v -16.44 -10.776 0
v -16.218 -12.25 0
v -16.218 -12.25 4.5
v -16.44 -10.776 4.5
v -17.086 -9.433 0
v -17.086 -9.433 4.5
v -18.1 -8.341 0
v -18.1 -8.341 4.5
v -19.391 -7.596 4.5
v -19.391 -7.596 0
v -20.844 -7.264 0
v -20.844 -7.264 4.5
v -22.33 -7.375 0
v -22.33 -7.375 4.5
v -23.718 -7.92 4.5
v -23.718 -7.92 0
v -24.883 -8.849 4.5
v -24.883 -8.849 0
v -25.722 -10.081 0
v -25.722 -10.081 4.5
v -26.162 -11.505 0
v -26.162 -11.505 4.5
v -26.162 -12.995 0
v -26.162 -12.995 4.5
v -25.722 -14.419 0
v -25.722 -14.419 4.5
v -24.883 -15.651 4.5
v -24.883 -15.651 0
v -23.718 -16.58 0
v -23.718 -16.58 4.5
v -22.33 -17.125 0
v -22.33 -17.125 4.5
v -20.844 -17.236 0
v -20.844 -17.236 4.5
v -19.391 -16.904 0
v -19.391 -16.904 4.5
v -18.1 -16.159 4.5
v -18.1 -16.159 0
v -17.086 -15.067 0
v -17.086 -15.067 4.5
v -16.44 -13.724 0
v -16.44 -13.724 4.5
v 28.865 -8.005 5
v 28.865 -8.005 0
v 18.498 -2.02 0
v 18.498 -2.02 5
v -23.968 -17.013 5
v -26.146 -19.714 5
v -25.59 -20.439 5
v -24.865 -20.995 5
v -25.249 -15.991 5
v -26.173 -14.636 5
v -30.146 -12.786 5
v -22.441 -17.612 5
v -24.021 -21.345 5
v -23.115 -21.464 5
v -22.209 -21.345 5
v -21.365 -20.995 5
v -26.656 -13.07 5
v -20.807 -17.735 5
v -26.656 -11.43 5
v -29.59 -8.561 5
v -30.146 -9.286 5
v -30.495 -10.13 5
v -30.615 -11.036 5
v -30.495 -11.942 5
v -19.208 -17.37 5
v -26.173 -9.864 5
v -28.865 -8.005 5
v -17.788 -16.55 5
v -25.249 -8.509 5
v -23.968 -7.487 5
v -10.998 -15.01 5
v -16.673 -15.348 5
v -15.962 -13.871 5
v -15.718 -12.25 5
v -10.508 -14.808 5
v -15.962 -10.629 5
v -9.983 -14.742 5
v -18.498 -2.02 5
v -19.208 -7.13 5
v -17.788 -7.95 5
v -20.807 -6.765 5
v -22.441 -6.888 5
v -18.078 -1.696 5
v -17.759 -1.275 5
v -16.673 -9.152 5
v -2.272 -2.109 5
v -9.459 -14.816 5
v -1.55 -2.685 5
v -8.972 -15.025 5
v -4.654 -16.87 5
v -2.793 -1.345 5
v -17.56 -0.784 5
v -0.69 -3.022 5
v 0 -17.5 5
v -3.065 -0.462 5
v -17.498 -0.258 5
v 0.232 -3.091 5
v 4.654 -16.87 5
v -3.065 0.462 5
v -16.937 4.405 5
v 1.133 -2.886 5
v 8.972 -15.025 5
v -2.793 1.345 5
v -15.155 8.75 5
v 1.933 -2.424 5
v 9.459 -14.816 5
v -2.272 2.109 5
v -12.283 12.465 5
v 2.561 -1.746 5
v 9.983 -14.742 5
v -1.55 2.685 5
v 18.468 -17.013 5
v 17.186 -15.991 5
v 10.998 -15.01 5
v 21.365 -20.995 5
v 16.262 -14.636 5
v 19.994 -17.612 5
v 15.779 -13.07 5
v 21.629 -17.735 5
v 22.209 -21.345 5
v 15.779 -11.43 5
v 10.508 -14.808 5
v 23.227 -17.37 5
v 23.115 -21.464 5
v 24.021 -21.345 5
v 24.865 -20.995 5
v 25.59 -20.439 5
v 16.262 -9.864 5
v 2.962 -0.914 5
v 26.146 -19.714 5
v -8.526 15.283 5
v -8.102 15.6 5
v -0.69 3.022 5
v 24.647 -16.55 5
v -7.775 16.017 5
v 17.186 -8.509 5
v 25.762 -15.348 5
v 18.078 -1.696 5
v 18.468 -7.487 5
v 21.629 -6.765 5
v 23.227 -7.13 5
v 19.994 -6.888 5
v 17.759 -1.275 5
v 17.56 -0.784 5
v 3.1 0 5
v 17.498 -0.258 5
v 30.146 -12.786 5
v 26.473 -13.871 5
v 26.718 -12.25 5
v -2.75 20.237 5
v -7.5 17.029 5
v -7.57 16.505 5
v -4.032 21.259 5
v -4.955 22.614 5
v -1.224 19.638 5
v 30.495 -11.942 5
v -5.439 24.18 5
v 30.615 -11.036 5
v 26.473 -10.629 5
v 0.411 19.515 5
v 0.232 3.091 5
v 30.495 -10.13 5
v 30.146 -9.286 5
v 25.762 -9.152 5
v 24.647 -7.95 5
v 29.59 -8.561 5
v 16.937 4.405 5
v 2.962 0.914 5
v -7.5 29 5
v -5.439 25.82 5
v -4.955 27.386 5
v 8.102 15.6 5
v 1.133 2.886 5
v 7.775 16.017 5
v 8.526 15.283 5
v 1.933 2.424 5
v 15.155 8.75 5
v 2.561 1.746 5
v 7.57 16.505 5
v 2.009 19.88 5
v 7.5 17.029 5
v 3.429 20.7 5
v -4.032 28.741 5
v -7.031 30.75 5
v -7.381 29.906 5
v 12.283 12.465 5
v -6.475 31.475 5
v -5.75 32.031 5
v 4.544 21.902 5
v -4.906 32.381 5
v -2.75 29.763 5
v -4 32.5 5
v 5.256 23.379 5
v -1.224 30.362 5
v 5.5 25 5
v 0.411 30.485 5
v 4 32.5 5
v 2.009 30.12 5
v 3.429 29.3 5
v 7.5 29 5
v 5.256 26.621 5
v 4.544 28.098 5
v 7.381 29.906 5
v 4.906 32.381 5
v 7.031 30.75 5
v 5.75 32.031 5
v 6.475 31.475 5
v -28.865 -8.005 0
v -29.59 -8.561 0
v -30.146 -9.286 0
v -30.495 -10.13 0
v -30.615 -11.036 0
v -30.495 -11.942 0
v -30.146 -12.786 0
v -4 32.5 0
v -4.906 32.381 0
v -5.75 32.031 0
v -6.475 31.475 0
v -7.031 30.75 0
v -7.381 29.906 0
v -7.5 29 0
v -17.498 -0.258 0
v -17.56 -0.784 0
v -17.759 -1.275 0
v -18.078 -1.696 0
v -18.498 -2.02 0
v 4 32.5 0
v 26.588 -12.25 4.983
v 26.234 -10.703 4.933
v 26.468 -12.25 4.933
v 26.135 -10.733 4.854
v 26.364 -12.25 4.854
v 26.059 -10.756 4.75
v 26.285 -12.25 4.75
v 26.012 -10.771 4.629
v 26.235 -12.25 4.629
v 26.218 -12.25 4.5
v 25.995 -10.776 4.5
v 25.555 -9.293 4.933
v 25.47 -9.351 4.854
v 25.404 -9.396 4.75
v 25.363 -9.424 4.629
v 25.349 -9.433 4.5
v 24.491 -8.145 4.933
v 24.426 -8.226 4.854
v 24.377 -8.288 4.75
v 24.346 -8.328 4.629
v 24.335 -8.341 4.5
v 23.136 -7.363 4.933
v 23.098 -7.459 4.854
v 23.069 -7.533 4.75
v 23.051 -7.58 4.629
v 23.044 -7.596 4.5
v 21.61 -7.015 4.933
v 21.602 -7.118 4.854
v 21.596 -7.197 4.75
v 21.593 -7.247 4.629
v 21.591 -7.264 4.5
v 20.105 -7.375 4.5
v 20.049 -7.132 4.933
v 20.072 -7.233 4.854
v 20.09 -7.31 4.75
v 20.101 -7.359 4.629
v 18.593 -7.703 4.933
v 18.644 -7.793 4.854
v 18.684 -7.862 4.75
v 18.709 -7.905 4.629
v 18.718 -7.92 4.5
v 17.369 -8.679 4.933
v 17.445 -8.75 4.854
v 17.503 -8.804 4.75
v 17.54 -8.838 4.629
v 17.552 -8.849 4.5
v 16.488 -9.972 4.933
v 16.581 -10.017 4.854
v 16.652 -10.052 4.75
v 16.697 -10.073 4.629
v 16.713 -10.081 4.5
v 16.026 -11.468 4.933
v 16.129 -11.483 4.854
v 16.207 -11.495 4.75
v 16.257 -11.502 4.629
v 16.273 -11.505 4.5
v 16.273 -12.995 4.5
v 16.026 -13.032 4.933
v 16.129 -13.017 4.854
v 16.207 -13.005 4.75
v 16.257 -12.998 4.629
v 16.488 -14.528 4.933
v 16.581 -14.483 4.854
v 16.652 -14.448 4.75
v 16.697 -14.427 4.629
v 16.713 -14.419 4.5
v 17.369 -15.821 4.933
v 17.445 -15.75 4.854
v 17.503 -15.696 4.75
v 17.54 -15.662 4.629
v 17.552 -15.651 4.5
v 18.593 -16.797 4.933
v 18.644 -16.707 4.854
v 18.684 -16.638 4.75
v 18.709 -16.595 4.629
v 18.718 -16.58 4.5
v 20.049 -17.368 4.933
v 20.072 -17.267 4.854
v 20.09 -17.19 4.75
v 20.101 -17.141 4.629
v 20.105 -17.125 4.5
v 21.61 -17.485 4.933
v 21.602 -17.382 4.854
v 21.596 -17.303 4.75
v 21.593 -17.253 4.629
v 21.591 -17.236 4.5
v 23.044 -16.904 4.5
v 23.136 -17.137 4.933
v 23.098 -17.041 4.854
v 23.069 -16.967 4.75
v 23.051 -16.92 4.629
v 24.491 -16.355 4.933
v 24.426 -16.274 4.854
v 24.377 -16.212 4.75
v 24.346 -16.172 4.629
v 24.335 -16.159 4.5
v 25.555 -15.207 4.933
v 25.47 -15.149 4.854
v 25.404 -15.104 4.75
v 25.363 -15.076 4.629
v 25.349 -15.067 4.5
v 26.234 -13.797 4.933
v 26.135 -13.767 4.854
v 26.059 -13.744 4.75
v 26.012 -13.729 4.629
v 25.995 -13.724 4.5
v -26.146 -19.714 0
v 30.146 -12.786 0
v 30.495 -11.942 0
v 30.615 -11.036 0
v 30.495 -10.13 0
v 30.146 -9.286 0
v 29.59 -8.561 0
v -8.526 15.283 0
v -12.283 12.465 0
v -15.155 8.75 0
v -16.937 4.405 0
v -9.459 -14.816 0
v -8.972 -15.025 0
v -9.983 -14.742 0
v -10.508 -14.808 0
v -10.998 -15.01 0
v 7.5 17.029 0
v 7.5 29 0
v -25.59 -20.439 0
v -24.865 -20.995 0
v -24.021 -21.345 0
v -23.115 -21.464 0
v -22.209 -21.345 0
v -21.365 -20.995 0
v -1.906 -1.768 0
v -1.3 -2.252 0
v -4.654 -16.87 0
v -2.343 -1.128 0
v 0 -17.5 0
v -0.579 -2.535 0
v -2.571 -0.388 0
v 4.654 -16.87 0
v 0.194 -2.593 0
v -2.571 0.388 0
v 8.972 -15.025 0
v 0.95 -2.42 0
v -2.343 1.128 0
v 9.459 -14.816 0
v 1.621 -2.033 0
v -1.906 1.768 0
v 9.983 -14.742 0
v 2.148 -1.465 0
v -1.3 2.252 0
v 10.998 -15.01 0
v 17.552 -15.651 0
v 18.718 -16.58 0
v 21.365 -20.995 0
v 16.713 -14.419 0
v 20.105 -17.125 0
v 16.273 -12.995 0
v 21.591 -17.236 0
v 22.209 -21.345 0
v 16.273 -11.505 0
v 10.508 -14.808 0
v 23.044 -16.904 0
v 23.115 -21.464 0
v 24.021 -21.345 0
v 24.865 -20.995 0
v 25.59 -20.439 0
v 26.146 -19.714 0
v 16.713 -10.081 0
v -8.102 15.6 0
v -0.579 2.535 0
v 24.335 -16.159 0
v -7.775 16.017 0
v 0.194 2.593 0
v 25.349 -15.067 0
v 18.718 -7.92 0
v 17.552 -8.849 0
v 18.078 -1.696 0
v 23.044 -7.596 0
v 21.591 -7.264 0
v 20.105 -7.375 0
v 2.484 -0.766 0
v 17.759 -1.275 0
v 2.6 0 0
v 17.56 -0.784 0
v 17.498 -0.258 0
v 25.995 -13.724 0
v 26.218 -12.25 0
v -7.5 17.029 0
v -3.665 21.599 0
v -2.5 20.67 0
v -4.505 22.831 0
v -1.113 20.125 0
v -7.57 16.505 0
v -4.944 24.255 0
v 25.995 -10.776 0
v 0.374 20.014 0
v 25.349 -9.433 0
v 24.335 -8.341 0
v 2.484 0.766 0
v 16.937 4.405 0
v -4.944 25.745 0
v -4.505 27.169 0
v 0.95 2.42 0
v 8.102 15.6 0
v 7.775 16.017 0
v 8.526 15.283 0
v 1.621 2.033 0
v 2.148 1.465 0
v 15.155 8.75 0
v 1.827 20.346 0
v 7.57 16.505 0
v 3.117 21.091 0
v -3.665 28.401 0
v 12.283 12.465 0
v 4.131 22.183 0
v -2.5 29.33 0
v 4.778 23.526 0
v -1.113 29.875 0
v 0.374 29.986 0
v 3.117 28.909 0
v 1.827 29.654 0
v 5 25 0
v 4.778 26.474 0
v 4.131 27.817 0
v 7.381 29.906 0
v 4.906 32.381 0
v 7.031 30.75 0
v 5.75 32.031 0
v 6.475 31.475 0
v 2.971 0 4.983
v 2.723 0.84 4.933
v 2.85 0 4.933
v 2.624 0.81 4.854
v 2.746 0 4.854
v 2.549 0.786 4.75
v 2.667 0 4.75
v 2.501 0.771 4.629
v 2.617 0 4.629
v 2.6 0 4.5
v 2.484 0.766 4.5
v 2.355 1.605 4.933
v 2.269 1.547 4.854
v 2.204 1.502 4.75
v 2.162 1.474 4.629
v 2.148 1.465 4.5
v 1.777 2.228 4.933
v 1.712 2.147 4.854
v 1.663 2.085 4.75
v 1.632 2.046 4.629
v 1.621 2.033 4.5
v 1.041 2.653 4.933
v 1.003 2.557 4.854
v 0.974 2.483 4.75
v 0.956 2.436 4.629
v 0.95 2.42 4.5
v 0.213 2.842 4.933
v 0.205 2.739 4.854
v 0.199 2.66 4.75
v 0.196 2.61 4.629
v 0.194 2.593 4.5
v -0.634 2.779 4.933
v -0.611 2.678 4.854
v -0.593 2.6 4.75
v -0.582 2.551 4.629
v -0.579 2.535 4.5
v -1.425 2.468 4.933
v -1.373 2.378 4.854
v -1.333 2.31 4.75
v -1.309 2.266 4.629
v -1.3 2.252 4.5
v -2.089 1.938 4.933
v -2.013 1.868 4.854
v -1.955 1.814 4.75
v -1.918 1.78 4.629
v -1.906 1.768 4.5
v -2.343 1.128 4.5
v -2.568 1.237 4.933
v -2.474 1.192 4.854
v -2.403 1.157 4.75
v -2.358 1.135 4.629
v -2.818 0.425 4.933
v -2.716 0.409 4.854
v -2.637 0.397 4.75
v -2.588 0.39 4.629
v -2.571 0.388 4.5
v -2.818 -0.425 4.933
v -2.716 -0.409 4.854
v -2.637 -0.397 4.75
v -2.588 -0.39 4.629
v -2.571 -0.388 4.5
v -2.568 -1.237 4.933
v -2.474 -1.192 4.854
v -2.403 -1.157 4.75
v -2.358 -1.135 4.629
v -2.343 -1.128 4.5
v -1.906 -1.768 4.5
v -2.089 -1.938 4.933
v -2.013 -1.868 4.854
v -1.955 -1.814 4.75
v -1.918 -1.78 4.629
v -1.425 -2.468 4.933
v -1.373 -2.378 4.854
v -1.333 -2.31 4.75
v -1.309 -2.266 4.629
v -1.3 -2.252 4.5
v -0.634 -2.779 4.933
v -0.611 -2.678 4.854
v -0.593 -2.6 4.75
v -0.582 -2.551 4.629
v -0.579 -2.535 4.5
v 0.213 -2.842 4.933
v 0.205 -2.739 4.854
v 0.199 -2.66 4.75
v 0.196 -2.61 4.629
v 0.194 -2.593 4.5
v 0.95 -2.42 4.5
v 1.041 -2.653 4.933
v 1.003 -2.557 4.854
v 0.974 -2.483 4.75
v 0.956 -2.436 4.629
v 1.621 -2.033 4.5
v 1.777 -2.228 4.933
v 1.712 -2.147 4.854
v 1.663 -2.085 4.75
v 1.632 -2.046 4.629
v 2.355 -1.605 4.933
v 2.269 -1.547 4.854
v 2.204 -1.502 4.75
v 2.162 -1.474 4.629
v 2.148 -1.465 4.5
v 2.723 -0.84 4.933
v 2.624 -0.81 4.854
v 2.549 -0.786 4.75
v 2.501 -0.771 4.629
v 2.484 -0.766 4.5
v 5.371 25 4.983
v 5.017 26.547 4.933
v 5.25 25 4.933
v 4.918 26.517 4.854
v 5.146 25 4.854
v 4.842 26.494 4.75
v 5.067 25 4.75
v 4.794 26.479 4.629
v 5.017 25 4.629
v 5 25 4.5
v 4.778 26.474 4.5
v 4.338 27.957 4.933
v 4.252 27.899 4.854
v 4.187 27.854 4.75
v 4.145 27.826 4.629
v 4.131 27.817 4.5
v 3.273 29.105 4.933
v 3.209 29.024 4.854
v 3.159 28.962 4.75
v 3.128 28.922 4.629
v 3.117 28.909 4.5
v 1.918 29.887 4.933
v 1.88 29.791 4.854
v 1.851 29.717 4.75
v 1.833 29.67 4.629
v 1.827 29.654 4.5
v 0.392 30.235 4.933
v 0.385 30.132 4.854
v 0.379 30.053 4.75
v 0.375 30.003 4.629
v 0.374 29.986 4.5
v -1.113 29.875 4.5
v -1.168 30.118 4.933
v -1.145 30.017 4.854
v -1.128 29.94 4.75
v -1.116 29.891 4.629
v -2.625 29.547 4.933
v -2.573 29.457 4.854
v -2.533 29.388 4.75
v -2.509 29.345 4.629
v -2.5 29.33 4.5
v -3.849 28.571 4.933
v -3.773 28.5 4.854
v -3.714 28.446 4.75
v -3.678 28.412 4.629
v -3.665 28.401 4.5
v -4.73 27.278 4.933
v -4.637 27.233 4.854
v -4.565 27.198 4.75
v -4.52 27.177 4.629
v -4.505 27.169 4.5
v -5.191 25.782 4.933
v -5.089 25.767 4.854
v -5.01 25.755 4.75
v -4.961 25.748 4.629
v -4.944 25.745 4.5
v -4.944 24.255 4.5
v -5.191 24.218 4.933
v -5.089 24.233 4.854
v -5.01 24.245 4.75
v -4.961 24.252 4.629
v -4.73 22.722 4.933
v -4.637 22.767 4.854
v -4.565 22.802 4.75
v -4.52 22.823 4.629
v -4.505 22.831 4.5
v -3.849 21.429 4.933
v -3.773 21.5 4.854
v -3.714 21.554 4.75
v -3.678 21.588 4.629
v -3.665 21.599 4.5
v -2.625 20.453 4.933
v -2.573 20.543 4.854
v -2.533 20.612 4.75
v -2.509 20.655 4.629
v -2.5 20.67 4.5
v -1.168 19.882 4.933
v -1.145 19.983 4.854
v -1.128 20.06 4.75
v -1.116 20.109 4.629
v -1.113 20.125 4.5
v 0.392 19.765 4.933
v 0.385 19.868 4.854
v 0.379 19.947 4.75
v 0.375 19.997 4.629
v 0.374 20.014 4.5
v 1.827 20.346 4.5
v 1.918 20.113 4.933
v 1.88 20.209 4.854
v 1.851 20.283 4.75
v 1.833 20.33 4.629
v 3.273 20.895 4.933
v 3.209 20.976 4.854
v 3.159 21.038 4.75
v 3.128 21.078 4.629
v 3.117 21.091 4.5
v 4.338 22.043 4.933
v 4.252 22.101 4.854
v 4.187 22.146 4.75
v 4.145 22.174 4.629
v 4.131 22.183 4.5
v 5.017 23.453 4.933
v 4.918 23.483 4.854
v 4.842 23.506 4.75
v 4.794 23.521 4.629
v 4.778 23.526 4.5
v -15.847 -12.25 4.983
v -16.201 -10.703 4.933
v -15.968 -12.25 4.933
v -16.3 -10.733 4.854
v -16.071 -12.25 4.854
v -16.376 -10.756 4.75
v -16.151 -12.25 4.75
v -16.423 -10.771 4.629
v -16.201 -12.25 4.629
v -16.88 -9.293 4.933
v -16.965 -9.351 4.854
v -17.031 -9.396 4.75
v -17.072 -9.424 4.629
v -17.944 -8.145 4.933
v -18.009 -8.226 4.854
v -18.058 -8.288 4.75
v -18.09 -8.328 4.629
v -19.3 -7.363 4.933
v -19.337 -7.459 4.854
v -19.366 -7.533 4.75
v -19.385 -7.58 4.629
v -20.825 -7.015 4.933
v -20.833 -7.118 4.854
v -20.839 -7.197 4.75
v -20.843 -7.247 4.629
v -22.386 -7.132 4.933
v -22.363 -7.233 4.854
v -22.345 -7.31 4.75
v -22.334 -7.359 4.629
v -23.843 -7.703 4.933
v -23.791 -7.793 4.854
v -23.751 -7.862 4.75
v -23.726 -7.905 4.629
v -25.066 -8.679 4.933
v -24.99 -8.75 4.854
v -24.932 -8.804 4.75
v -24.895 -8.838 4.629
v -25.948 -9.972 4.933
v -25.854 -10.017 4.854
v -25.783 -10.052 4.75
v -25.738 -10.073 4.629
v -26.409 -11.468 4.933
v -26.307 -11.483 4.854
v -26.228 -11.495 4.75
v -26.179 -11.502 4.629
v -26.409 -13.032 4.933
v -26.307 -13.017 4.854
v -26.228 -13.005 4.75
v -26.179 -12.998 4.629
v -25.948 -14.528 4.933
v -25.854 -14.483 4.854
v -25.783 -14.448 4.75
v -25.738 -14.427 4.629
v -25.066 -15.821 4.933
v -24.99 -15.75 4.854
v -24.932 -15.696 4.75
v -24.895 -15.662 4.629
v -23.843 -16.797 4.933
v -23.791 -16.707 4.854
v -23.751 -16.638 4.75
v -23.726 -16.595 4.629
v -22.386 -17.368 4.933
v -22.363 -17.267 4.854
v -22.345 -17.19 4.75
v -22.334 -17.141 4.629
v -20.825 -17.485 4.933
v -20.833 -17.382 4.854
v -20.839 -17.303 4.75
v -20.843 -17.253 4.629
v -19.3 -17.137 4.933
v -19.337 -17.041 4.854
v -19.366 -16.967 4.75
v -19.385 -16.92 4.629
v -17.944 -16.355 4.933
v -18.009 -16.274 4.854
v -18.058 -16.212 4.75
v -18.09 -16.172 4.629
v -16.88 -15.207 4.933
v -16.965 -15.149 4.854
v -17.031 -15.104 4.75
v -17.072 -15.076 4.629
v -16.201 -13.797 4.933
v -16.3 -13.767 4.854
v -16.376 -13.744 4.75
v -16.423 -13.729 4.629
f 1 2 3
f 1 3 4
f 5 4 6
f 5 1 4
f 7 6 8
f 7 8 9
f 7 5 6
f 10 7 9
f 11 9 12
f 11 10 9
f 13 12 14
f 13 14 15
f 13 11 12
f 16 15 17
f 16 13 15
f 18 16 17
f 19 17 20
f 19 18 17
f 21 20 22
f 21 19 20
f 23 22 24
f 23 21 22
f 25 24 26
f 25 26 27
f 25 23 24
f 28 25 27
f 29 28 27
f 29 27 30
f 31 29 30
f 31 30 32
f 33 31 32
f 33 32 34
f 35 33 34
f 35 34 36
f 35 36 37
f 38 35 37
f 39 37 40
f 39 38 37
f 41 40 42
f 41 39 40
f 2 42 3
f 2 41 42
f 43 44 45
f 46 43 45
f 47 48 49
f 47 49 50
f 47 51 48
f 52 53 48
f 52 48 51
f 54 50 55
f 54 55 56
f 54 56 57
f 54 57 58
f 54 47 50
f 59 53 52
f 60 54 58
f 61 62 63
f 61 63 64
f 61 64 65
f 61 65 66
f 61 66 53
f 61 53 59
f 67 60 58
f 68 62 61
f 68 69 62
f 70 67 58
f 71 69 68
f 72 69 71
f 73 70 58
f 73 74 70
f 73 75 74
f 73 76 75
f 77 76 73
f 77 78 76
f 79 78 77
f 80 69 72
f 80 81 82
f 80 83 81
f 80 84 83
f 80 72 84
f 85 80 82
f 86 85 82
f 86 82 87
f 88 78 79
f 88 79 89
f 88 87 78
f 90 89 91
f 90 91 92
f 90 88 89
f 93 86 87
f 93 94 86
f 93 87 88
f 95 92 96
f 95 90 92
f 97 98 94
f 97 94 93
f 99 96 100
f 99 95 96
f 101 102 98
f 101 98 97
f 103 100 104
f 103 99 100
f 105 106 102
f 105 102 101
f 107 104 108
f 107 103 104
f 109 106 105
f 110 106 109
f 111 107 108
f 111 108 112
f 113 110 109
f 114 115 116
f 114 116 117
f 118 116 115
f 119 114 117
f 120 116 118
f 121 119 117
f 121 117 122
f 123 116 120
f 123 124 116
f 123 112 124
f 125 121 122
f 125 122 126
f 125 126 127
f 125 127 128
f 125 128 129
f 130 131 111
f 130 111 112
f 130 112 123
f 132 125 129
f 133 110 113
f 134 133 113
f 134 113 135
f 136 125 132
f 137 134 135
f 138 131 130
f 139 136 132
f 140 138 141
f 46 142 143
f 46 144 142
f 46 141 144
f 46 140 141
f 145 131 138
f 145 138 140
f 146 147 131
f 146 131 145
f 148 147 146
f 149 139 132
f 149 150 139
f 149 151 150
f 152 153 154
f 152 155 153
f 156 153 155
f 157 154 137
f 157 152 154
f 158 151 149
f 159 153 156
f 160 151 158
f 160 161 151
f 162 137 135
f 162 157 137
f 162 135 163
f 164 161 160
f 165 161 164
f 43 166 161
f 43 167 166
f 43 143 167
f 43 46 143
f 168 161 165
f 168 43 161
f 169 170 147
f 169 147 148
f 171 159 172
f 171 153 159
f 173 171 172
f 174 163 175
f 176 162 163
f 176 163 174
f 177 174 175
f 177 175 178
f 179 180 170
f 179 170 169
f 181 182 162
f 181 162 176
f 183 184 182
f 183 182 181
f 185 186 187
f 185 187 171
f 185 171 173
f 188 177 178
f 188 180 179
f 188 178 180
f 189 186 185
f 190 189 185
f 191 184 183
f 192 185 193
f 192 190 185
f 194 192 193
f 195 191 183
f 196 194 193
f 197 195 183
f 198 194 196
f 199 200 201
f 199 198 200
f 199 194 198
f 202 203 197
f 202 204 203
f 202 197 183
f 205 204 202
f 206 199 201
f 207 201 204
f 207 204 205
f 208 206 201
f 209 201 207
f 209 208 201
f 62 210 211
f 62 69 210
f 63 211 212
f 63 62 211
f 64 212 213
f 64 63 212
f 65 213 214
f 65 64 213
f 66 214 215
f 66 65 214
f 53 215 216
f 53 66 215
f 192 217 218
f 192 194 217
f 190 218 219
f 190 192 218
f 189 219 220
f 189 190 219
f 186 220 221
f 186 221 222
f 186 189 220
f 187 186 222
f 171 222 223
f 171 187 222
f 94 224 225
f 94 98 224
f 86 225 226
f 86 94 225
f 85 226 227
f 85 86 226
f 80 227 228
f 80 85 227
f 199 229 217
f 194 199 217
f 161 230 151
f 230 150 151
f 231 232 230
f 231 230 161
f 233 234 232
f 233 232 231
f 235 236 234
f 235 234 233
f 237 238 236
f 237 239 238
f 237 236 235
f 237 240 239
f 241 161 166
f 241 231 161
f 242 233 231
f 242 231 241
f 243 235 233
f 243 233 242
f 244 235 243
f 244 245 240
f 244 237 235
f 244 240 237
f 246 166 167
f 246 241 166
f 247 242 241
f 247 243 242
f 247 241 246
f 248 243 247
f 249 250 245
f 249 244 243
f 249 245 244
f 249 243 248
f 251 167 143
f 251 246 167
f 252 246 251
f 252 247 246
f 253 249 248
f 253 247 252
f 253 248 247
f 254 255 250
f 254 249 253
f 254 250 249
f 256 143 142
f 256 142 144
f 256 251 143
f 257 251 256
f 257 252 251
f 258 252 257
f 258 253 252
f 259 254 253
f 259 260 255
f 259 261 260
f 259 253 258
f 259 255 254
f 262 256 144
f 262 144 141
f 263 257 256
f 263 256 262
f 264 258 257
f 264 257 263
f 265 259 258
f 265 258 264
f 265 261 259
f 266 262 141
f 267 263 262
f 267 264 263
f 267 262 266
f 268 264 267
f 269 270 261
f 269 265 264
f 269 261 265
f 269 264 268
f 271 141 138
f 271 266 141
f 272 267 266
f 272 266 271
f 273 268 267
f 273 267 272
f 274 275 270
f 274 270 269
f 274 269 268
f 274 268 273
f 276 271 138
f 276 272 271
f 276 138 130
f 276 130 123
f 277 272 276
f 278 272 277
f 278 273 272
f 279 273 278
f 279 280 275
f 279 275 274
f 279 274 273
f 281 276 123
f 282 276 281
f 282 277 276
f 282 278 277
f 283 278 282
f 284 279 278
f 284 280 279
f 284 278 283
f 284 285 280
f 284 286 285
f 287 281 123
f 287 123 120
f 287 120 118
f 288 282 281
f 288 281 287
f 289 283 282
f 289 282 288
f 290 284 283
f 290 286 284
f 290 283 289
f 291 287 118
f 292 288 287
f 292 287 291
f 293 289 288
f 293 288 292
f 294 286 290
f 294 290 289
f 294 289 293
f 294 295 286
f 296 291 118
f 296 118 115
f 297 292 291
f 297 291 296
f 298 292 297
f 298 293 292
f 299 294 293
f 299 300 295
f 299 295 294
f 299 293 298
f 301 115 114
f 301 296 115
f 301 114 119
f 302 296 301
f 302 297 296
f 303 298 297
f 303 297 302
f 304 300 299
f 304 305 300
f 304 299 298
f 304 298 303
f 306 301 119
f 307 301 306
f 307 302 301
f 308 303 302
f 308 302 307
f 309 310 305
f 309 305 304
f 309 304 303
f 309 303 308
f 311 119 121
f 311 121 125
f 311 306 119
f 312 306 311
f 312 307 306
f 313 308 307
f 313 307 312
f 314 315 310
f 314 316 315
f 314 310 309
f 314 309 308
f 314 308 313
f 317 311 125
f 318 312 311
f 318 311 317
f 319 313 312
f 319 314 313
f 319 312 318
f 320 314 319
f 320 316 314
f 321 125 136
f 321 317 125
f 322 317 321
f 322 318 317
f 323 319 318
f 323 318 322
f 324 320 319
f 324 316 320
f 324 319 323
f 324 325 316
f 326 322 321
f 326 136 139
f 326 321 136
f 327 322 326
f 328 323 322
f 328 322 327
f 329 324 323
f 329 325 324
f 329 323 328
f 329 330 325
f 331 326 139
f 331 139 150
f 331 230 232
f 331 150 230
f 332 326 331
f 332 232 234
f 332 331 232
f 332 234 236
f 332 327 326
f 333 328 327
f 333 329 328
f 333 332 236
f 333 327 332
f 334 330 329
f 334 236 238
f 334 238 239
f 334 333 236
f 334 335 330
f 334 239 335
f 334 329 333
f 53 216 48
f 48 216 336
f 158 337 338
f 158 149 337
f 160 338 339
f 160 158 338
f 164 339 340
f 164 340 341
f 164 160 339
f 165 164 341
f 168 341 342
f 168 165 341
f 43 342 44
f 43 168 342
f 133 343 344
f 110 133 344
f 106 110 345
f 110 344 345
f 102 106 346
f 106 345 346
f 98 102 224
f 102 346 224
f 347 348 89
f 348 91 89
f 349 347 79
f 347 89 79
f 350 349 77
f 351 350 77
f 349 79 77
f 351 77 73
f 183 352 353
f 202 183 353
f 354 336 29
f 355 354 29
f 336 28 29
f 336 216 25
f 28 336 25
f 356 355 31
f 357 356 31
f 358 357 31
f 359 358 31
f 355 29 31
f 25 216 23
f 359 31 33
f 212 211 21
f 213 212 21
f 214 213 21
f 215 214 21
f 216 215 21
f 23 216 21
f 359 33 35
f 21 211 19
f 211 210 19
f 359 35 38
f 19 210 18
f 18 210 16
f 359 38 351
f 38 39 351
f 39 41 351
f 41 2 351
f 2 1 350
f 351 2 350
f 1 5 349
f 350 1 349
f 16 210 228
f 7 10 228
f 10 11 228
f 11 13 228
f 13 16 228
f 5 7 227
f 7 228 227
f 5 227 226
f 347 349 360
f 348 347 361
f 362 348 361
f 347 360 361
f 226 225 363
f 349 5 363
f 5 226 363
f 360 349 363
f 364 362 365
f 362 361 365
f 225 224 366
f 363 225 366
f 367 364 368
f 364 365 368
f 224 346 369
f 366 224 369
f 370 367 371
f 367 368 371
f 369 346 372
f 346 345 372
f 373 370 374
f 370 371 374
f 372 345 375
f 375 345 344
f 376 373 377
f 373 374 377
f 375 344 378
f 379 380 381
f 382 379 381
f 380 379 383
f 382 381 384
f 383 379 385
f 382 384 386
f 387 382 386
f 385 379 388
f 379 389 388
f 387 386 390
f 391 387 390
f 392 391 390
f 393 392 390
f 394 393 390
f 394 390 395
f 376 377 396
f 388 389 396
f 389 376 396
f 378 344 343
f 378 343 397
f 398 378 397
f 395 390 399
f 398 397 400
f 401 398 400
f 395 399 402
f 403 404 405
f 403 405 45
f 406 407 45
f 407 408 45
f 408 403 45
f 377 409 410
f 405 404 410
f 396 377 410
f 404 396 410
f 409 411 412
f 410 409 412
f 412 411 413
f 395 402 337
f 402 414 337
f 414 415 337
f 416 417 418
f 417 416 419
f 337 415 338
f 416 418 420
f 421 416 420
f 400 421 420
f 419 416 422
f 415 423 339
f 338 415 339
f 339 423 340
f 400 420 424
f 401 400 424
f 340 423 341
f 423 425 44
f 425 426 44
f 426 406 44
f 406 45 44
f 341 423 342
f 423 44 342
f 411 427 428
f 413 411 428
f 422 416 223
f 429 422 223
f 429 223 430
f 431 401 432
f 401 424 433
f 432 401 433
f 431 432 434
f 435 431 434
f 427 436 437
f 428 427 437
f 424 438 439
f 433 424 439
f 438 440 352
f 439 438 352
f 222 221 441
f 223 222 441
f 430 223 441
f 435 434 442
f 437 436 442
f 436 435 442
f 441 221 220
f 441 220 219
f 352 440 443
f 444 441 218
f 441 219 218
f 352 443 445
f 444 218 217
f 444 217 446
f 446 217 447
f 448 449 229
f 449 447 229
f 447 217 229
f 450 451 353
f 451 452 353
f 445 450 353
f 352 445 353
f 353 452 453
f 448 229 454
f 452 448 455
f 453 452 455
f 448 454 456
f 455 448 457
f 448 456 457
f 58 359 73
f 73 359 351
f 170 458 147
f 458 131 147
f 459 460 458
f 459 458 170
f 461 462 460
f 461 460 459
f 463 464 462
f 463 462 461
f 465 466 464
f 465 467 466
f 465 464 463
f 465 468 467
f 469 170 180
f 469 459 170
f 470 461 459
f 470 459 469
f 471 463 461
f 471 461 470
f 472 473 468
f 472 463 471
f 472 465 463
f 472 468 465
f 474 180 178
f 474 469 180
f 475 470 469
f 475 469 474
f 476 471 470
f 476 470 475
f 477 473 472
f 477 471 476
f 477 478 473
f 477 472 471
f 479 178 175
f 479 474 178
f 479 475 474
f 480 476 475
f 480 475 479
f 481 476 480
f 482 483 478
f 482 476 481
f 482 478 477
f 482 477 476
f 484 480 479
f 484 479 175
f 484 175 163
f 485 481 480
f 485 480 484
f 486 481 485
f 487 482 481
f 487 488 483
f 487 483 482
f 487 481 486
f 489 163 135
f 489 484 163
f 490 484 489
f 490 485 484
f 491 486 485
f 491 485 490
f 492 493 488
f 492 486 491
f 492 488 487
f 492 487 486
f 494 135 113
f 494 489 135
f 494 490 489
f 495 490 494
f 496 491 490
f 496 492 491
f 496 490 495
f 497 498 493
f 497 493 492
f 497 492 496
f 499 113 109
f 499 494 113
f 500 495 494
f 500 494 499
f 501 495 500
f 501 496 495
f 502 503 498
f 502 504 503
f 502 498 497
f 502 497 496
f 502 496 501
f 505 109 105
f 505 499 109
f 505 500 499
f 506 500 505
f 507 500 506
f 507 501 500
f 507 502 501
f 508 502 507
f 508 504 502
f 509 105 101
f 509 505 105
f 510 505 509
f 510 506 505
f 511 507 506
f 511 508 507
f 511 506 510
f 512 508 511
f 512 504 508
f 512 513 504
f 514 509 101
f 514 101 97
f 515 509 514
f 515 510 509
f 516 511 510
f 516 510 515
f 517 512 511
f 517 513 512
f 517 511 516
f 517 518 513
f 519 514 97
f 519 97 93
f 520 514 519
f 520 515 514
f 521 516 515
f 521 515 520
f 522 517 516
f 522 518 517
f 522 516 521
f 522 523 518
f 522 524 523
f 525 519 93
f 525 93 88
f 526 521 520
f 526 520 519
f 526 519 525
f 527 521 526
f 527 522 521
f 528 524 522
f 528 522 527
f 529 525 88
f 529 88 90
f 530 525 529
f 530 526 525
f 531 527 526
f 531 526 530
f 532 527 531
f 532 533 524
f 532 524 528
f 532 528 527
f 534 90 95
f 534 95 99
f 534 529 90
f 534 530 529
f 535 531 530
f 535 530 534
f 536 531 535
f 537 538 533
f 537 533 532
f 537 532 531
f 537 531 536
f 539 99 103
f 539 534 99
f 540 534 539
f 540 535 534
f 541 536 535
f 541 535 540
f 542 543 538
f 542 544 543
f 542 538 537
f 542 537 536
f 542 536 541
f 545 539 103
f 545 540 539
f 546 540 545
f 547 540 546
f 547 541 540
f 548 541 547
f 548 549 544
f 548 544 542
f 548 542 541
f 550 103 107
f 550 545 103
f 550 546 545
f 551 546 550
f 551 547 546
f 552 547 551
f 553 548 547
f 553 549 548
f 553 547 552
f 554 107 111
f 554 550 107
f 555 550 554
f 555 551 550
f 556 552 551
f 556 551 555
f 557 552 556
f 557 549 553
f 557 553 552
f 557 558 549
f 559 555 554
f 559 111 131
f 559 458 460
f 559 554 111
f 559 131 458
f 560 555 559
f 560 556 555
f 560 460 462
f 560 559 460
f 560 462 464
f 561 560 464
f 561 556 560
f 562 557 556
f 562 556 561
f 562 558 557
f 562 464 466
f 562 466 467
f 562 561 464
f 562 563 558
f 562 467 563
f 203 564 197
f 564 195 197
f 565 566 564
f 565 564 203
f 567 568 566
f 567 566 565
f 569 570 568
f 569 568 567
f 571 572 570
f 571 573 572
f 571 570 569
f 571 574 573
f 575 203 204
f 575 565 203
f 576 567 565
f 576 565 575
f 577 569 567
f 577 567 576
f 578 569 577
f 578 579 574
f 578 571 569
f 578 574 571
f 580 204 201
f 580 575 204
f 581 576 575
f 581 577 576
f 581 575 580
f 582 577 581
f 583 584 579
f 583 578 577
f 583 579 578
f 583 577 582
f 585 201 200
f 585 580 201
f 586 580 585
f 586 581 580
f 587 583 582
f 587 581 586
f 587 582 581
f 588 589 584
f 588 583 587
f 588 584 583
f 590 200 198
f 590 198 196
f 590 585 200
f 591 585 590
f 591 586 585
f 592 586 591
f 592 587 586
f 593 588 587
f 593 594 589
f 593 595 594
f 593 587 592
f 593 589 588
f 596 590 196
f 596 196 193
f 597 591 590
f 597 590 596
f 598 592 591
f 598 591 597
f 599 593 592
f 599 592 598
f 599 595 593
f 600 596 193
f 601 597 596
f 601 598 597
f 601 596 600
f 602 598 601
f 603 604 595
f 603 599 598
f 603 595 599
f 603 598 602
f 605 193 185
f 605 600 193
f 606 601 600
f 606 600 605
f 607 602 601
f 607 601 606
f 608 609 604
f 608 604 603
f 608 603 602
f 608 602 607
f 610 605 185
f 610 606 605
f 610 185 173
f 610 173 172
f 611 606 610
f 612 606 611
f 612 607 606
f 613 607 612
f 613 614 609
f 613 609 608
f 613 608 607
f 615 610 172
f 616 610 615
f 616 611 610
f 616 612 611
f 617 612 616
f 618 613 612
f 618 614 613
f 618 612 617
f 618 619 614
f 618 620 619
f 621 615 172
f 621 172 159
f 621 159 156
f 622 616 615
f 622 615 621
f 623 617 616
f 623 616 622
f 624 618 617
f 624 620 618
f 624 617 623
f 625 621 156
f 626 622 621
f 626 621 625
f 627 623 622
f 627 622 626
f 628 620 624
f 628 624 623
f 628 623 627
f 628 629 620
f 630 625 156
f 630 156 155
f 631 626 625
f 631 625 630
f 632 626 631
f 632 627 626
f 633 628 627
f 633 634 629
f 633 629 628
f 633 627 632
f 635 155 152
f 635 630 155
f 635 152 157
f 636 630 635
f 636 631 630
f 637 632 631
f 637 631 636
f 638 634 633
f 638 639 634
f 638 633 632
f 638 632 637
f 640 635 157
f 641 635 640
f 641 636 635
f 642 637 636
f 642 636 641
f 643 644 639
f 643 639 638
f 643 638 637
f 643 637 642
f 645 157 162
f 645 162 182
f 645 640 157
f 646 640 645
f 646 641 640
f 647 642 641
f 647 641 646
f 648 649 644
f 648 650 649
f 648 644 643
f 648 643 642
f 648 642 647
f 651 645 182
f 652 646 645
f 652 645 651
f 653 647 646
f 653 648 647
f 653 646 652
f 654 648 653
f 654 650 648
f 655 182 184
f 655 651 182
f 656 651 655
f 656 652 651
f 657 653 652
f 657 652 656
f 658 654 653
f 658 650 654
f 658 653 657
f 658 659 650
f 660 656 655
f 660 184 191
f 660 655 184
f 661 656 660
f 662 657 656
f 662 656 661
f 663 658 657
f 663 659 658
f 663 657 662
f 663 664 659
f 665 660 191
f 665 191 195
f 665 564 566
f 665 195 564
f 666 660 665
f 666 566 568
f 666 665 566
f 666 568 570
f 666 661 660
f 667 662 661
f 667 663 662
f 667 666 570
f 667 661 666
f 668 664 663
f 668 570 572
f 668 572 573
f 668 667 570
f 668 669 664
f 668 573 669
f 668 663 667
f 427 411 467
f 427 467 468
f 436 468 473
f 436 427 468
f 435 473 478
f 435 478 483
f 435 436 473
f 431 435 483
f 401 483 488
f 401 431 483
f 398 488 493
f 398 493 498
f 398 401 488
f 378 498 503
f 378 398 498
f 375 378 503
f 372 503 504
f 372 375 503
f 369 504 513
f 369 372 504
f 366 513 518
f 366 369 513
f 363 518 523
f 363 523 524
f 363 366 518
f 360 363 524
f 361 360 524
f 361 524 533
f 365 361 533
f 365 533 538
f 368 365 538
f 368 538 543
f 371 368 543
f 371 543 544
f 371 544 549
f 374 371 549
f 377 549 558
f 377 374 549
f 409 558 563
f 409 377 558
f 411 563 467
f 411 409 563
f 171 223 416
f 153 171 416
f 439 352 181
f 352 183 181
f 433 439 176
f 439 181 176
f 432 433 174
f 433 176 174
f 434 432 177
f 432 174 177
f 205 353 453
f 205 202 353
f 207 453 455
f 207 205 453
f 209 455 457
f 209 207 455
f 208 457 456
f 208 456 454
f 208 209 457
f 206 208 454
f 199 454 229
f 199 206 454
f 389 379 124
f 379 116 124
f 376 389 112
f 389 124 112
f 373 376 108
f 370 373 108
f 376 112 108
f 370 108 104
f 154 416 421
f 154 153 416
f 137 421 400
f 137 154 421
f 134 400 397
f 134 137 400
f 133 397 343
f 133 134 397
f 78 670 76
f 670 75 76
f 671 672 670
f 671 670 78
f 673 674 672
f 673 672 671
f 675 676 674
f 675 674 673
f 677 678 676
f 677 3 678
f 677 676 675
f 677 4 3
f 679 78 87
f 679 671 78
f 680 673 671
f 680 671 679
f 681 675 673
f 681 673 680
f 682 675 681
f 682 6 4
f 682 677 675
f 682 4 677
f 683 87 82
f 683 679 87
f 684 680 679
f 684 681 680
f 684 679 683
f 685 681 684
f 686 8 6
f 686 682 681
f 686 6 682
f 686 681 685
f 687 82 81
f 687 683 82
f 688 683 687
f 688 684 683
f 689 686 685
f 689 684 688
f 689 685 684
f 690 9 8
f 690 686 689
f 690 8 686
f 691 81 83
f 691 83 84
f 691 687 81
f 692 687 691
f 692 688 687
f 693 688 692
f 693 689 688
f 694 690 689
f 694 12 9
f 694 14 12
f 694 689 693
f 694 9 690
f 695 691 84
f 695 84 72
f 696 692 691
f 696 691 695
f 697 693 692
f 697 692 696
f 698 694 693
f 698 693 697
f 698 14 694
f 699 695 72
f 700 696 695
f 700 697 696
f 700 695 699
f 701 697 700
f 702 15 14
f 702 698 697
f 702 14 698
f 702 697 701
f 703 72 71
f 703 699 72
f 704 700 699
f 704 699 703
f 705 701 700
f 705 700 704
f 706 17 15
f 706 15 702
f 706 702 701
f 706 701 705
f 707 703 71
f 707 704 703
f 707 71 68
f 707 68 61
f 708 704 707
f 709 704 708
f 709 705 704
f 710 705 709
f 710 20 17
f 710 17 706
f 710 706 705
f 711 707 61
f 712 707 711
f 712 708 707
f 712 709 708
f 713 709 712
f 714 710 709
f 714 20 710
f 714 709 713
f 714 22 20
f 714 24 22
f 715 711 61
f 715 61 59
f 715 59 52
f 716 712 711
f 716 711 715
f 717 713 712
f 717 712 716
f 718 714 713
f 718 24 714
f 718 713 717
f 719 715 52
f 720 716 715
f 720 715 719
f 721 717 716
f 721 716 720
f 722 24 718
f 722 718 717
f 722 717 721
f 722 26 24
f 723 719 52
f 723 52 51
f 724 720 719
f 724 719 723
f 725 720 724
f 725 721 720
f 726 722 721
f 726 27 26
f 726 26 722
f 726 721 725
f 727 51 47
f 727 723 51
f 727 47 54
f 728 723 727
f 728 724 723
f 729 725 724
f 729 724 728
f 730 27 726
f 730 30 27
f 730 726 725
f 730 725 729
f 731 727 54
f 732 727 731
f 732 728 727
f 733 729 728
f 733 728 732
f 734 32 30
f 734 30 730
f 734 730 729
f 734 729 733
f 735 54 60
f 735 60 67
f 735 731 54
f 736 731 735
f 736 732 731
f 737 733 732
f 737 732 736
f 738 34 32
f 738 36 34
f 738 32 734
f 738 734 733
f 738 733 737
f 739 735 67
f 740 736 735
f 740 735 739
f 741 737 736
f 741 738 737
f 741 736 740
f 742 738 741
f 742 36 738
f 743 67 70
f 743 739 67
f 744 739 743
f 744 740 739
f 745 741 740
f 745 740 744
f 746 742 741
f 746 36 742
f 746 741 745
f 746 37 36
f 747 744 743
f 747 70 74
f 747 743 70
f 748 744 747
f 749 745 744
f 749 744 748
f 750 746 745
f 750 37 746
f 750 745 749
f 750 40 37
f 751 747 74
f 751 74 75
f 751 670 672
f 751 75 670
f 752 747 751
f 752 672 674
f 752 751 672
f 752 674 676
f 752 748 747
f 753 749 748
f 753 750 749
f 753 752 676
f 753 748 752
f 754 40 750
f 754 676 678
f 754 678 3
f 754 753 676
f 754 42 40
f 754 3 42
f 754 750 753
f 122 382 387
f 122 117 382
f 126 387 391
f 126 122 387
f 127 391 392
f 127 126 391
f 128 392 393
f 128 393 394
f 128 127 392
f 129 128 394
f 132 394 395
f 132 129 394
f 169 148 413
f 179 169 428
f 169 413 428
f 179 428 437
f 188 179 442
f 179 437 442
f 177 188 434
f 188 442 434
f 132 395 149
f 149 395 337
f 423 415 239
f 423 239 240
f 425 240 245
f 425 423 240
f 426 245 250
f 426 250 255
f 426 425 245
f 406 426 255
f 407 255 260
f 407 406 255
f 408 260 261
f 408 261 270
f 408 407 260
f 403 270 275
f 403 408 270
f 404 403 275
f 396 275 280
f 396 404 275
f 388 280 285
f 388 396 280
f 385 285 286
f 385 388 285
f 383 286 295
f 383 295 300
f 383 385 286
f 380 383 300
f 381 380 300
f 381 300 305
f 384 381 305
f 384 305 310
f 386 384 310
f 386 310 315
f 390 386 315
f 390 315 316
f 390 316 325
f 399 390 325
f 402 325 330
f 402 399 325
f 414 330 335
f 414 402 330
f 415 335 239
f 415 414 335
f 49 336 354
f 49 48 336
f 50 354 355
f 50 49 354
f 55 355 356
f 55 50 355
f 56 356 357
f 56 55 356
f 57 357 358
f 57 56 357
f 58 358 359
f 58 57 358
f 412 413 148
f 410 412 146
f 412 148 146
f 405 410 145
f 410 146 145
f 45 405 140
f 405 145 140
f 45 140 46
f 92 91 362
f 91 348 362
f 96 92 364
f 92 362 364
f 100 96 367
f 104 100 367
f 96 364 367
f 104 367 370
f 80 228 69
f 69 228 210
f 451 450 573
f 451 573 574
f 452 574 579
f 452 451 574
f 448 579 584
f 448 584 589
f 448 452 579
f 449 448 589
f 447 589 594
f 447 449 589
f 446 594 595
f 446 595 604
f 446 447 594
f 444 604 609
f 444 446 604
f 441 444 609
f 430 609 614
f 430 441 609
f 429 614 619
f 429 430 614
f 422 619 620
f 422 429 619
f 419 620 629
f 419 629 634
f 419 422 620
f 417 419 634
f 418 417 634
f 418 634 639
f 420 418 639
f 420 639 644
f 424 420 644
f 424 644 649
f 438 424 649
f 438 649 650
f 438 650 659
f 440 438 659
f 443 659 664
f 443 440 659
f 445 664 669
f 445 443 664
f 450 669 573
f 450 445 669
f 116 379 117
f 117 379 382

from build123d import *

# Parameters (mm, degrees)
SKETCH1_R           = 5
SKETCH1_R_2         = 17.5
SKETCH1_R_3         = 2.6
BOSS_EXTRUDE1_DEPTH = 5
FILLET1_R           = 3.5
FILLET2_R           = 2
FILLET3_R           = 0.5


with BuildPart() as part:
    # Sketch1 → Boss-Extrude1 (new body)
    # profile 1 of 4: a face of its own
    with BuildSketch(Plane.XY):
        with BuildLine():
            ThreePointArc((-9.943063938, -14.400884679), (-15.155444566, -8.75), (-17.443063938, -1.410503622))
            Line((-17.443063938, -1.410503622), (-31.895825623, -9.754809472))
            Line((-31.895825623, -9.754809472), (-24.395825623, -22.745190528))
            Line((-24.395825623, -22.745190528), (-9.943063938, -14.400884679))
        make_face()
        with Locations((-21.217622393, -12.25)):
            Circle(SKETCH1_R, mode=Mode.SUBTRACT)
    # profile 2 of 4: a face of its own
    with BuildSketch(Plane.XY):
        Circle(SKETCH1_R_2)
        Circle(SKETCH1_R_3, mode=Mode.SUBTRACT)
    # profile 3 of 4: a face of its own
    with BuildSketch(Plane.XY):
        with BuildLine():
            Line((31.895825623, -9.754809472), (17.443063938, -1.410503622))
            ThreePointArc((17.443063938, -1.410503622), (15.155444566, -8.75), (9.943063938, -14.400884679))
            Line((9.943063938, -14.400884679), (24.395825623, -22.745190528))
            Line((24.395825623, -22.745190528), (31.895825623, -9.754809472))
        make_face()
        with Locations((21.217622393, -12.25)):
            Circle(SKETCH1_R, mode=Mode.SUBTRACT)
    # profile 4 of 4: a face of its own
    with BuildSketch(Plane.XY):
        with BuildLine():
            Line((7.5, 32.5), (-7.5, 32.5))
            Line((-7.5, 32.5), (-7.5, 15.811388301))
            ThreePointArc((-7.5, 15.811388301), (0, 17.5), (7.5, 15.811388301))
            Line((7.5, 15.811388301), (7.5, 32.5))
        make_face()
        with Locations((0, 25)):
            Circle(SKETCH1_R, mode=Mode.SUBTRACT)
    extrude(amount=BOSS_EXTRUDE1_DEPTH)

    # Fillet1
    fillet1_edges = [part.edges().sort_by_distance(p)[0] for p in [
        (-24.395825623, -22.745190528, 2.5),
        (-31.895825623, -9.754809472, 2.5),
        (-7.5, 32.5, 2.5),
        (7.5, 32.5, 2.5),
        (31.895825623, -9.754809472, 2.5),
        (24.395825623, -22.745190528, 2.5),
    ]]
    fillet(fillet1_edges, radius=FILLET1_R)

    # Fillet2
    fillet2_edges = [part.edges().sort_by_distance(p)[0] for p in [
        (-17.443063938, -1.410503622, 2.5),
        (-7.5, 15.811388301, 2.5),
        (7.5, 15.811388301, 2.5),
        (17.443063938, -1.410503622, 2.5),
        (9.943063938, -14.400884679, 2.5),
        (-9.943063938, -14.400884679, 2.5),
    ]]
    fillet(fillet2_edges, radius=FILLET2_R)

    # Fillet3
    fillet3_edges = [part.edges().sort_by_distance(p)[0] for p in [
        (-2.6, 0, 5),
        (-5, 25, 5),
        (16.217622393, -12.25, 5),
        (-26.217622393, -12.25, 5),
    ]]
    fillet(fillet3_edges, radius=FILLET3_R)


solid = part.part
